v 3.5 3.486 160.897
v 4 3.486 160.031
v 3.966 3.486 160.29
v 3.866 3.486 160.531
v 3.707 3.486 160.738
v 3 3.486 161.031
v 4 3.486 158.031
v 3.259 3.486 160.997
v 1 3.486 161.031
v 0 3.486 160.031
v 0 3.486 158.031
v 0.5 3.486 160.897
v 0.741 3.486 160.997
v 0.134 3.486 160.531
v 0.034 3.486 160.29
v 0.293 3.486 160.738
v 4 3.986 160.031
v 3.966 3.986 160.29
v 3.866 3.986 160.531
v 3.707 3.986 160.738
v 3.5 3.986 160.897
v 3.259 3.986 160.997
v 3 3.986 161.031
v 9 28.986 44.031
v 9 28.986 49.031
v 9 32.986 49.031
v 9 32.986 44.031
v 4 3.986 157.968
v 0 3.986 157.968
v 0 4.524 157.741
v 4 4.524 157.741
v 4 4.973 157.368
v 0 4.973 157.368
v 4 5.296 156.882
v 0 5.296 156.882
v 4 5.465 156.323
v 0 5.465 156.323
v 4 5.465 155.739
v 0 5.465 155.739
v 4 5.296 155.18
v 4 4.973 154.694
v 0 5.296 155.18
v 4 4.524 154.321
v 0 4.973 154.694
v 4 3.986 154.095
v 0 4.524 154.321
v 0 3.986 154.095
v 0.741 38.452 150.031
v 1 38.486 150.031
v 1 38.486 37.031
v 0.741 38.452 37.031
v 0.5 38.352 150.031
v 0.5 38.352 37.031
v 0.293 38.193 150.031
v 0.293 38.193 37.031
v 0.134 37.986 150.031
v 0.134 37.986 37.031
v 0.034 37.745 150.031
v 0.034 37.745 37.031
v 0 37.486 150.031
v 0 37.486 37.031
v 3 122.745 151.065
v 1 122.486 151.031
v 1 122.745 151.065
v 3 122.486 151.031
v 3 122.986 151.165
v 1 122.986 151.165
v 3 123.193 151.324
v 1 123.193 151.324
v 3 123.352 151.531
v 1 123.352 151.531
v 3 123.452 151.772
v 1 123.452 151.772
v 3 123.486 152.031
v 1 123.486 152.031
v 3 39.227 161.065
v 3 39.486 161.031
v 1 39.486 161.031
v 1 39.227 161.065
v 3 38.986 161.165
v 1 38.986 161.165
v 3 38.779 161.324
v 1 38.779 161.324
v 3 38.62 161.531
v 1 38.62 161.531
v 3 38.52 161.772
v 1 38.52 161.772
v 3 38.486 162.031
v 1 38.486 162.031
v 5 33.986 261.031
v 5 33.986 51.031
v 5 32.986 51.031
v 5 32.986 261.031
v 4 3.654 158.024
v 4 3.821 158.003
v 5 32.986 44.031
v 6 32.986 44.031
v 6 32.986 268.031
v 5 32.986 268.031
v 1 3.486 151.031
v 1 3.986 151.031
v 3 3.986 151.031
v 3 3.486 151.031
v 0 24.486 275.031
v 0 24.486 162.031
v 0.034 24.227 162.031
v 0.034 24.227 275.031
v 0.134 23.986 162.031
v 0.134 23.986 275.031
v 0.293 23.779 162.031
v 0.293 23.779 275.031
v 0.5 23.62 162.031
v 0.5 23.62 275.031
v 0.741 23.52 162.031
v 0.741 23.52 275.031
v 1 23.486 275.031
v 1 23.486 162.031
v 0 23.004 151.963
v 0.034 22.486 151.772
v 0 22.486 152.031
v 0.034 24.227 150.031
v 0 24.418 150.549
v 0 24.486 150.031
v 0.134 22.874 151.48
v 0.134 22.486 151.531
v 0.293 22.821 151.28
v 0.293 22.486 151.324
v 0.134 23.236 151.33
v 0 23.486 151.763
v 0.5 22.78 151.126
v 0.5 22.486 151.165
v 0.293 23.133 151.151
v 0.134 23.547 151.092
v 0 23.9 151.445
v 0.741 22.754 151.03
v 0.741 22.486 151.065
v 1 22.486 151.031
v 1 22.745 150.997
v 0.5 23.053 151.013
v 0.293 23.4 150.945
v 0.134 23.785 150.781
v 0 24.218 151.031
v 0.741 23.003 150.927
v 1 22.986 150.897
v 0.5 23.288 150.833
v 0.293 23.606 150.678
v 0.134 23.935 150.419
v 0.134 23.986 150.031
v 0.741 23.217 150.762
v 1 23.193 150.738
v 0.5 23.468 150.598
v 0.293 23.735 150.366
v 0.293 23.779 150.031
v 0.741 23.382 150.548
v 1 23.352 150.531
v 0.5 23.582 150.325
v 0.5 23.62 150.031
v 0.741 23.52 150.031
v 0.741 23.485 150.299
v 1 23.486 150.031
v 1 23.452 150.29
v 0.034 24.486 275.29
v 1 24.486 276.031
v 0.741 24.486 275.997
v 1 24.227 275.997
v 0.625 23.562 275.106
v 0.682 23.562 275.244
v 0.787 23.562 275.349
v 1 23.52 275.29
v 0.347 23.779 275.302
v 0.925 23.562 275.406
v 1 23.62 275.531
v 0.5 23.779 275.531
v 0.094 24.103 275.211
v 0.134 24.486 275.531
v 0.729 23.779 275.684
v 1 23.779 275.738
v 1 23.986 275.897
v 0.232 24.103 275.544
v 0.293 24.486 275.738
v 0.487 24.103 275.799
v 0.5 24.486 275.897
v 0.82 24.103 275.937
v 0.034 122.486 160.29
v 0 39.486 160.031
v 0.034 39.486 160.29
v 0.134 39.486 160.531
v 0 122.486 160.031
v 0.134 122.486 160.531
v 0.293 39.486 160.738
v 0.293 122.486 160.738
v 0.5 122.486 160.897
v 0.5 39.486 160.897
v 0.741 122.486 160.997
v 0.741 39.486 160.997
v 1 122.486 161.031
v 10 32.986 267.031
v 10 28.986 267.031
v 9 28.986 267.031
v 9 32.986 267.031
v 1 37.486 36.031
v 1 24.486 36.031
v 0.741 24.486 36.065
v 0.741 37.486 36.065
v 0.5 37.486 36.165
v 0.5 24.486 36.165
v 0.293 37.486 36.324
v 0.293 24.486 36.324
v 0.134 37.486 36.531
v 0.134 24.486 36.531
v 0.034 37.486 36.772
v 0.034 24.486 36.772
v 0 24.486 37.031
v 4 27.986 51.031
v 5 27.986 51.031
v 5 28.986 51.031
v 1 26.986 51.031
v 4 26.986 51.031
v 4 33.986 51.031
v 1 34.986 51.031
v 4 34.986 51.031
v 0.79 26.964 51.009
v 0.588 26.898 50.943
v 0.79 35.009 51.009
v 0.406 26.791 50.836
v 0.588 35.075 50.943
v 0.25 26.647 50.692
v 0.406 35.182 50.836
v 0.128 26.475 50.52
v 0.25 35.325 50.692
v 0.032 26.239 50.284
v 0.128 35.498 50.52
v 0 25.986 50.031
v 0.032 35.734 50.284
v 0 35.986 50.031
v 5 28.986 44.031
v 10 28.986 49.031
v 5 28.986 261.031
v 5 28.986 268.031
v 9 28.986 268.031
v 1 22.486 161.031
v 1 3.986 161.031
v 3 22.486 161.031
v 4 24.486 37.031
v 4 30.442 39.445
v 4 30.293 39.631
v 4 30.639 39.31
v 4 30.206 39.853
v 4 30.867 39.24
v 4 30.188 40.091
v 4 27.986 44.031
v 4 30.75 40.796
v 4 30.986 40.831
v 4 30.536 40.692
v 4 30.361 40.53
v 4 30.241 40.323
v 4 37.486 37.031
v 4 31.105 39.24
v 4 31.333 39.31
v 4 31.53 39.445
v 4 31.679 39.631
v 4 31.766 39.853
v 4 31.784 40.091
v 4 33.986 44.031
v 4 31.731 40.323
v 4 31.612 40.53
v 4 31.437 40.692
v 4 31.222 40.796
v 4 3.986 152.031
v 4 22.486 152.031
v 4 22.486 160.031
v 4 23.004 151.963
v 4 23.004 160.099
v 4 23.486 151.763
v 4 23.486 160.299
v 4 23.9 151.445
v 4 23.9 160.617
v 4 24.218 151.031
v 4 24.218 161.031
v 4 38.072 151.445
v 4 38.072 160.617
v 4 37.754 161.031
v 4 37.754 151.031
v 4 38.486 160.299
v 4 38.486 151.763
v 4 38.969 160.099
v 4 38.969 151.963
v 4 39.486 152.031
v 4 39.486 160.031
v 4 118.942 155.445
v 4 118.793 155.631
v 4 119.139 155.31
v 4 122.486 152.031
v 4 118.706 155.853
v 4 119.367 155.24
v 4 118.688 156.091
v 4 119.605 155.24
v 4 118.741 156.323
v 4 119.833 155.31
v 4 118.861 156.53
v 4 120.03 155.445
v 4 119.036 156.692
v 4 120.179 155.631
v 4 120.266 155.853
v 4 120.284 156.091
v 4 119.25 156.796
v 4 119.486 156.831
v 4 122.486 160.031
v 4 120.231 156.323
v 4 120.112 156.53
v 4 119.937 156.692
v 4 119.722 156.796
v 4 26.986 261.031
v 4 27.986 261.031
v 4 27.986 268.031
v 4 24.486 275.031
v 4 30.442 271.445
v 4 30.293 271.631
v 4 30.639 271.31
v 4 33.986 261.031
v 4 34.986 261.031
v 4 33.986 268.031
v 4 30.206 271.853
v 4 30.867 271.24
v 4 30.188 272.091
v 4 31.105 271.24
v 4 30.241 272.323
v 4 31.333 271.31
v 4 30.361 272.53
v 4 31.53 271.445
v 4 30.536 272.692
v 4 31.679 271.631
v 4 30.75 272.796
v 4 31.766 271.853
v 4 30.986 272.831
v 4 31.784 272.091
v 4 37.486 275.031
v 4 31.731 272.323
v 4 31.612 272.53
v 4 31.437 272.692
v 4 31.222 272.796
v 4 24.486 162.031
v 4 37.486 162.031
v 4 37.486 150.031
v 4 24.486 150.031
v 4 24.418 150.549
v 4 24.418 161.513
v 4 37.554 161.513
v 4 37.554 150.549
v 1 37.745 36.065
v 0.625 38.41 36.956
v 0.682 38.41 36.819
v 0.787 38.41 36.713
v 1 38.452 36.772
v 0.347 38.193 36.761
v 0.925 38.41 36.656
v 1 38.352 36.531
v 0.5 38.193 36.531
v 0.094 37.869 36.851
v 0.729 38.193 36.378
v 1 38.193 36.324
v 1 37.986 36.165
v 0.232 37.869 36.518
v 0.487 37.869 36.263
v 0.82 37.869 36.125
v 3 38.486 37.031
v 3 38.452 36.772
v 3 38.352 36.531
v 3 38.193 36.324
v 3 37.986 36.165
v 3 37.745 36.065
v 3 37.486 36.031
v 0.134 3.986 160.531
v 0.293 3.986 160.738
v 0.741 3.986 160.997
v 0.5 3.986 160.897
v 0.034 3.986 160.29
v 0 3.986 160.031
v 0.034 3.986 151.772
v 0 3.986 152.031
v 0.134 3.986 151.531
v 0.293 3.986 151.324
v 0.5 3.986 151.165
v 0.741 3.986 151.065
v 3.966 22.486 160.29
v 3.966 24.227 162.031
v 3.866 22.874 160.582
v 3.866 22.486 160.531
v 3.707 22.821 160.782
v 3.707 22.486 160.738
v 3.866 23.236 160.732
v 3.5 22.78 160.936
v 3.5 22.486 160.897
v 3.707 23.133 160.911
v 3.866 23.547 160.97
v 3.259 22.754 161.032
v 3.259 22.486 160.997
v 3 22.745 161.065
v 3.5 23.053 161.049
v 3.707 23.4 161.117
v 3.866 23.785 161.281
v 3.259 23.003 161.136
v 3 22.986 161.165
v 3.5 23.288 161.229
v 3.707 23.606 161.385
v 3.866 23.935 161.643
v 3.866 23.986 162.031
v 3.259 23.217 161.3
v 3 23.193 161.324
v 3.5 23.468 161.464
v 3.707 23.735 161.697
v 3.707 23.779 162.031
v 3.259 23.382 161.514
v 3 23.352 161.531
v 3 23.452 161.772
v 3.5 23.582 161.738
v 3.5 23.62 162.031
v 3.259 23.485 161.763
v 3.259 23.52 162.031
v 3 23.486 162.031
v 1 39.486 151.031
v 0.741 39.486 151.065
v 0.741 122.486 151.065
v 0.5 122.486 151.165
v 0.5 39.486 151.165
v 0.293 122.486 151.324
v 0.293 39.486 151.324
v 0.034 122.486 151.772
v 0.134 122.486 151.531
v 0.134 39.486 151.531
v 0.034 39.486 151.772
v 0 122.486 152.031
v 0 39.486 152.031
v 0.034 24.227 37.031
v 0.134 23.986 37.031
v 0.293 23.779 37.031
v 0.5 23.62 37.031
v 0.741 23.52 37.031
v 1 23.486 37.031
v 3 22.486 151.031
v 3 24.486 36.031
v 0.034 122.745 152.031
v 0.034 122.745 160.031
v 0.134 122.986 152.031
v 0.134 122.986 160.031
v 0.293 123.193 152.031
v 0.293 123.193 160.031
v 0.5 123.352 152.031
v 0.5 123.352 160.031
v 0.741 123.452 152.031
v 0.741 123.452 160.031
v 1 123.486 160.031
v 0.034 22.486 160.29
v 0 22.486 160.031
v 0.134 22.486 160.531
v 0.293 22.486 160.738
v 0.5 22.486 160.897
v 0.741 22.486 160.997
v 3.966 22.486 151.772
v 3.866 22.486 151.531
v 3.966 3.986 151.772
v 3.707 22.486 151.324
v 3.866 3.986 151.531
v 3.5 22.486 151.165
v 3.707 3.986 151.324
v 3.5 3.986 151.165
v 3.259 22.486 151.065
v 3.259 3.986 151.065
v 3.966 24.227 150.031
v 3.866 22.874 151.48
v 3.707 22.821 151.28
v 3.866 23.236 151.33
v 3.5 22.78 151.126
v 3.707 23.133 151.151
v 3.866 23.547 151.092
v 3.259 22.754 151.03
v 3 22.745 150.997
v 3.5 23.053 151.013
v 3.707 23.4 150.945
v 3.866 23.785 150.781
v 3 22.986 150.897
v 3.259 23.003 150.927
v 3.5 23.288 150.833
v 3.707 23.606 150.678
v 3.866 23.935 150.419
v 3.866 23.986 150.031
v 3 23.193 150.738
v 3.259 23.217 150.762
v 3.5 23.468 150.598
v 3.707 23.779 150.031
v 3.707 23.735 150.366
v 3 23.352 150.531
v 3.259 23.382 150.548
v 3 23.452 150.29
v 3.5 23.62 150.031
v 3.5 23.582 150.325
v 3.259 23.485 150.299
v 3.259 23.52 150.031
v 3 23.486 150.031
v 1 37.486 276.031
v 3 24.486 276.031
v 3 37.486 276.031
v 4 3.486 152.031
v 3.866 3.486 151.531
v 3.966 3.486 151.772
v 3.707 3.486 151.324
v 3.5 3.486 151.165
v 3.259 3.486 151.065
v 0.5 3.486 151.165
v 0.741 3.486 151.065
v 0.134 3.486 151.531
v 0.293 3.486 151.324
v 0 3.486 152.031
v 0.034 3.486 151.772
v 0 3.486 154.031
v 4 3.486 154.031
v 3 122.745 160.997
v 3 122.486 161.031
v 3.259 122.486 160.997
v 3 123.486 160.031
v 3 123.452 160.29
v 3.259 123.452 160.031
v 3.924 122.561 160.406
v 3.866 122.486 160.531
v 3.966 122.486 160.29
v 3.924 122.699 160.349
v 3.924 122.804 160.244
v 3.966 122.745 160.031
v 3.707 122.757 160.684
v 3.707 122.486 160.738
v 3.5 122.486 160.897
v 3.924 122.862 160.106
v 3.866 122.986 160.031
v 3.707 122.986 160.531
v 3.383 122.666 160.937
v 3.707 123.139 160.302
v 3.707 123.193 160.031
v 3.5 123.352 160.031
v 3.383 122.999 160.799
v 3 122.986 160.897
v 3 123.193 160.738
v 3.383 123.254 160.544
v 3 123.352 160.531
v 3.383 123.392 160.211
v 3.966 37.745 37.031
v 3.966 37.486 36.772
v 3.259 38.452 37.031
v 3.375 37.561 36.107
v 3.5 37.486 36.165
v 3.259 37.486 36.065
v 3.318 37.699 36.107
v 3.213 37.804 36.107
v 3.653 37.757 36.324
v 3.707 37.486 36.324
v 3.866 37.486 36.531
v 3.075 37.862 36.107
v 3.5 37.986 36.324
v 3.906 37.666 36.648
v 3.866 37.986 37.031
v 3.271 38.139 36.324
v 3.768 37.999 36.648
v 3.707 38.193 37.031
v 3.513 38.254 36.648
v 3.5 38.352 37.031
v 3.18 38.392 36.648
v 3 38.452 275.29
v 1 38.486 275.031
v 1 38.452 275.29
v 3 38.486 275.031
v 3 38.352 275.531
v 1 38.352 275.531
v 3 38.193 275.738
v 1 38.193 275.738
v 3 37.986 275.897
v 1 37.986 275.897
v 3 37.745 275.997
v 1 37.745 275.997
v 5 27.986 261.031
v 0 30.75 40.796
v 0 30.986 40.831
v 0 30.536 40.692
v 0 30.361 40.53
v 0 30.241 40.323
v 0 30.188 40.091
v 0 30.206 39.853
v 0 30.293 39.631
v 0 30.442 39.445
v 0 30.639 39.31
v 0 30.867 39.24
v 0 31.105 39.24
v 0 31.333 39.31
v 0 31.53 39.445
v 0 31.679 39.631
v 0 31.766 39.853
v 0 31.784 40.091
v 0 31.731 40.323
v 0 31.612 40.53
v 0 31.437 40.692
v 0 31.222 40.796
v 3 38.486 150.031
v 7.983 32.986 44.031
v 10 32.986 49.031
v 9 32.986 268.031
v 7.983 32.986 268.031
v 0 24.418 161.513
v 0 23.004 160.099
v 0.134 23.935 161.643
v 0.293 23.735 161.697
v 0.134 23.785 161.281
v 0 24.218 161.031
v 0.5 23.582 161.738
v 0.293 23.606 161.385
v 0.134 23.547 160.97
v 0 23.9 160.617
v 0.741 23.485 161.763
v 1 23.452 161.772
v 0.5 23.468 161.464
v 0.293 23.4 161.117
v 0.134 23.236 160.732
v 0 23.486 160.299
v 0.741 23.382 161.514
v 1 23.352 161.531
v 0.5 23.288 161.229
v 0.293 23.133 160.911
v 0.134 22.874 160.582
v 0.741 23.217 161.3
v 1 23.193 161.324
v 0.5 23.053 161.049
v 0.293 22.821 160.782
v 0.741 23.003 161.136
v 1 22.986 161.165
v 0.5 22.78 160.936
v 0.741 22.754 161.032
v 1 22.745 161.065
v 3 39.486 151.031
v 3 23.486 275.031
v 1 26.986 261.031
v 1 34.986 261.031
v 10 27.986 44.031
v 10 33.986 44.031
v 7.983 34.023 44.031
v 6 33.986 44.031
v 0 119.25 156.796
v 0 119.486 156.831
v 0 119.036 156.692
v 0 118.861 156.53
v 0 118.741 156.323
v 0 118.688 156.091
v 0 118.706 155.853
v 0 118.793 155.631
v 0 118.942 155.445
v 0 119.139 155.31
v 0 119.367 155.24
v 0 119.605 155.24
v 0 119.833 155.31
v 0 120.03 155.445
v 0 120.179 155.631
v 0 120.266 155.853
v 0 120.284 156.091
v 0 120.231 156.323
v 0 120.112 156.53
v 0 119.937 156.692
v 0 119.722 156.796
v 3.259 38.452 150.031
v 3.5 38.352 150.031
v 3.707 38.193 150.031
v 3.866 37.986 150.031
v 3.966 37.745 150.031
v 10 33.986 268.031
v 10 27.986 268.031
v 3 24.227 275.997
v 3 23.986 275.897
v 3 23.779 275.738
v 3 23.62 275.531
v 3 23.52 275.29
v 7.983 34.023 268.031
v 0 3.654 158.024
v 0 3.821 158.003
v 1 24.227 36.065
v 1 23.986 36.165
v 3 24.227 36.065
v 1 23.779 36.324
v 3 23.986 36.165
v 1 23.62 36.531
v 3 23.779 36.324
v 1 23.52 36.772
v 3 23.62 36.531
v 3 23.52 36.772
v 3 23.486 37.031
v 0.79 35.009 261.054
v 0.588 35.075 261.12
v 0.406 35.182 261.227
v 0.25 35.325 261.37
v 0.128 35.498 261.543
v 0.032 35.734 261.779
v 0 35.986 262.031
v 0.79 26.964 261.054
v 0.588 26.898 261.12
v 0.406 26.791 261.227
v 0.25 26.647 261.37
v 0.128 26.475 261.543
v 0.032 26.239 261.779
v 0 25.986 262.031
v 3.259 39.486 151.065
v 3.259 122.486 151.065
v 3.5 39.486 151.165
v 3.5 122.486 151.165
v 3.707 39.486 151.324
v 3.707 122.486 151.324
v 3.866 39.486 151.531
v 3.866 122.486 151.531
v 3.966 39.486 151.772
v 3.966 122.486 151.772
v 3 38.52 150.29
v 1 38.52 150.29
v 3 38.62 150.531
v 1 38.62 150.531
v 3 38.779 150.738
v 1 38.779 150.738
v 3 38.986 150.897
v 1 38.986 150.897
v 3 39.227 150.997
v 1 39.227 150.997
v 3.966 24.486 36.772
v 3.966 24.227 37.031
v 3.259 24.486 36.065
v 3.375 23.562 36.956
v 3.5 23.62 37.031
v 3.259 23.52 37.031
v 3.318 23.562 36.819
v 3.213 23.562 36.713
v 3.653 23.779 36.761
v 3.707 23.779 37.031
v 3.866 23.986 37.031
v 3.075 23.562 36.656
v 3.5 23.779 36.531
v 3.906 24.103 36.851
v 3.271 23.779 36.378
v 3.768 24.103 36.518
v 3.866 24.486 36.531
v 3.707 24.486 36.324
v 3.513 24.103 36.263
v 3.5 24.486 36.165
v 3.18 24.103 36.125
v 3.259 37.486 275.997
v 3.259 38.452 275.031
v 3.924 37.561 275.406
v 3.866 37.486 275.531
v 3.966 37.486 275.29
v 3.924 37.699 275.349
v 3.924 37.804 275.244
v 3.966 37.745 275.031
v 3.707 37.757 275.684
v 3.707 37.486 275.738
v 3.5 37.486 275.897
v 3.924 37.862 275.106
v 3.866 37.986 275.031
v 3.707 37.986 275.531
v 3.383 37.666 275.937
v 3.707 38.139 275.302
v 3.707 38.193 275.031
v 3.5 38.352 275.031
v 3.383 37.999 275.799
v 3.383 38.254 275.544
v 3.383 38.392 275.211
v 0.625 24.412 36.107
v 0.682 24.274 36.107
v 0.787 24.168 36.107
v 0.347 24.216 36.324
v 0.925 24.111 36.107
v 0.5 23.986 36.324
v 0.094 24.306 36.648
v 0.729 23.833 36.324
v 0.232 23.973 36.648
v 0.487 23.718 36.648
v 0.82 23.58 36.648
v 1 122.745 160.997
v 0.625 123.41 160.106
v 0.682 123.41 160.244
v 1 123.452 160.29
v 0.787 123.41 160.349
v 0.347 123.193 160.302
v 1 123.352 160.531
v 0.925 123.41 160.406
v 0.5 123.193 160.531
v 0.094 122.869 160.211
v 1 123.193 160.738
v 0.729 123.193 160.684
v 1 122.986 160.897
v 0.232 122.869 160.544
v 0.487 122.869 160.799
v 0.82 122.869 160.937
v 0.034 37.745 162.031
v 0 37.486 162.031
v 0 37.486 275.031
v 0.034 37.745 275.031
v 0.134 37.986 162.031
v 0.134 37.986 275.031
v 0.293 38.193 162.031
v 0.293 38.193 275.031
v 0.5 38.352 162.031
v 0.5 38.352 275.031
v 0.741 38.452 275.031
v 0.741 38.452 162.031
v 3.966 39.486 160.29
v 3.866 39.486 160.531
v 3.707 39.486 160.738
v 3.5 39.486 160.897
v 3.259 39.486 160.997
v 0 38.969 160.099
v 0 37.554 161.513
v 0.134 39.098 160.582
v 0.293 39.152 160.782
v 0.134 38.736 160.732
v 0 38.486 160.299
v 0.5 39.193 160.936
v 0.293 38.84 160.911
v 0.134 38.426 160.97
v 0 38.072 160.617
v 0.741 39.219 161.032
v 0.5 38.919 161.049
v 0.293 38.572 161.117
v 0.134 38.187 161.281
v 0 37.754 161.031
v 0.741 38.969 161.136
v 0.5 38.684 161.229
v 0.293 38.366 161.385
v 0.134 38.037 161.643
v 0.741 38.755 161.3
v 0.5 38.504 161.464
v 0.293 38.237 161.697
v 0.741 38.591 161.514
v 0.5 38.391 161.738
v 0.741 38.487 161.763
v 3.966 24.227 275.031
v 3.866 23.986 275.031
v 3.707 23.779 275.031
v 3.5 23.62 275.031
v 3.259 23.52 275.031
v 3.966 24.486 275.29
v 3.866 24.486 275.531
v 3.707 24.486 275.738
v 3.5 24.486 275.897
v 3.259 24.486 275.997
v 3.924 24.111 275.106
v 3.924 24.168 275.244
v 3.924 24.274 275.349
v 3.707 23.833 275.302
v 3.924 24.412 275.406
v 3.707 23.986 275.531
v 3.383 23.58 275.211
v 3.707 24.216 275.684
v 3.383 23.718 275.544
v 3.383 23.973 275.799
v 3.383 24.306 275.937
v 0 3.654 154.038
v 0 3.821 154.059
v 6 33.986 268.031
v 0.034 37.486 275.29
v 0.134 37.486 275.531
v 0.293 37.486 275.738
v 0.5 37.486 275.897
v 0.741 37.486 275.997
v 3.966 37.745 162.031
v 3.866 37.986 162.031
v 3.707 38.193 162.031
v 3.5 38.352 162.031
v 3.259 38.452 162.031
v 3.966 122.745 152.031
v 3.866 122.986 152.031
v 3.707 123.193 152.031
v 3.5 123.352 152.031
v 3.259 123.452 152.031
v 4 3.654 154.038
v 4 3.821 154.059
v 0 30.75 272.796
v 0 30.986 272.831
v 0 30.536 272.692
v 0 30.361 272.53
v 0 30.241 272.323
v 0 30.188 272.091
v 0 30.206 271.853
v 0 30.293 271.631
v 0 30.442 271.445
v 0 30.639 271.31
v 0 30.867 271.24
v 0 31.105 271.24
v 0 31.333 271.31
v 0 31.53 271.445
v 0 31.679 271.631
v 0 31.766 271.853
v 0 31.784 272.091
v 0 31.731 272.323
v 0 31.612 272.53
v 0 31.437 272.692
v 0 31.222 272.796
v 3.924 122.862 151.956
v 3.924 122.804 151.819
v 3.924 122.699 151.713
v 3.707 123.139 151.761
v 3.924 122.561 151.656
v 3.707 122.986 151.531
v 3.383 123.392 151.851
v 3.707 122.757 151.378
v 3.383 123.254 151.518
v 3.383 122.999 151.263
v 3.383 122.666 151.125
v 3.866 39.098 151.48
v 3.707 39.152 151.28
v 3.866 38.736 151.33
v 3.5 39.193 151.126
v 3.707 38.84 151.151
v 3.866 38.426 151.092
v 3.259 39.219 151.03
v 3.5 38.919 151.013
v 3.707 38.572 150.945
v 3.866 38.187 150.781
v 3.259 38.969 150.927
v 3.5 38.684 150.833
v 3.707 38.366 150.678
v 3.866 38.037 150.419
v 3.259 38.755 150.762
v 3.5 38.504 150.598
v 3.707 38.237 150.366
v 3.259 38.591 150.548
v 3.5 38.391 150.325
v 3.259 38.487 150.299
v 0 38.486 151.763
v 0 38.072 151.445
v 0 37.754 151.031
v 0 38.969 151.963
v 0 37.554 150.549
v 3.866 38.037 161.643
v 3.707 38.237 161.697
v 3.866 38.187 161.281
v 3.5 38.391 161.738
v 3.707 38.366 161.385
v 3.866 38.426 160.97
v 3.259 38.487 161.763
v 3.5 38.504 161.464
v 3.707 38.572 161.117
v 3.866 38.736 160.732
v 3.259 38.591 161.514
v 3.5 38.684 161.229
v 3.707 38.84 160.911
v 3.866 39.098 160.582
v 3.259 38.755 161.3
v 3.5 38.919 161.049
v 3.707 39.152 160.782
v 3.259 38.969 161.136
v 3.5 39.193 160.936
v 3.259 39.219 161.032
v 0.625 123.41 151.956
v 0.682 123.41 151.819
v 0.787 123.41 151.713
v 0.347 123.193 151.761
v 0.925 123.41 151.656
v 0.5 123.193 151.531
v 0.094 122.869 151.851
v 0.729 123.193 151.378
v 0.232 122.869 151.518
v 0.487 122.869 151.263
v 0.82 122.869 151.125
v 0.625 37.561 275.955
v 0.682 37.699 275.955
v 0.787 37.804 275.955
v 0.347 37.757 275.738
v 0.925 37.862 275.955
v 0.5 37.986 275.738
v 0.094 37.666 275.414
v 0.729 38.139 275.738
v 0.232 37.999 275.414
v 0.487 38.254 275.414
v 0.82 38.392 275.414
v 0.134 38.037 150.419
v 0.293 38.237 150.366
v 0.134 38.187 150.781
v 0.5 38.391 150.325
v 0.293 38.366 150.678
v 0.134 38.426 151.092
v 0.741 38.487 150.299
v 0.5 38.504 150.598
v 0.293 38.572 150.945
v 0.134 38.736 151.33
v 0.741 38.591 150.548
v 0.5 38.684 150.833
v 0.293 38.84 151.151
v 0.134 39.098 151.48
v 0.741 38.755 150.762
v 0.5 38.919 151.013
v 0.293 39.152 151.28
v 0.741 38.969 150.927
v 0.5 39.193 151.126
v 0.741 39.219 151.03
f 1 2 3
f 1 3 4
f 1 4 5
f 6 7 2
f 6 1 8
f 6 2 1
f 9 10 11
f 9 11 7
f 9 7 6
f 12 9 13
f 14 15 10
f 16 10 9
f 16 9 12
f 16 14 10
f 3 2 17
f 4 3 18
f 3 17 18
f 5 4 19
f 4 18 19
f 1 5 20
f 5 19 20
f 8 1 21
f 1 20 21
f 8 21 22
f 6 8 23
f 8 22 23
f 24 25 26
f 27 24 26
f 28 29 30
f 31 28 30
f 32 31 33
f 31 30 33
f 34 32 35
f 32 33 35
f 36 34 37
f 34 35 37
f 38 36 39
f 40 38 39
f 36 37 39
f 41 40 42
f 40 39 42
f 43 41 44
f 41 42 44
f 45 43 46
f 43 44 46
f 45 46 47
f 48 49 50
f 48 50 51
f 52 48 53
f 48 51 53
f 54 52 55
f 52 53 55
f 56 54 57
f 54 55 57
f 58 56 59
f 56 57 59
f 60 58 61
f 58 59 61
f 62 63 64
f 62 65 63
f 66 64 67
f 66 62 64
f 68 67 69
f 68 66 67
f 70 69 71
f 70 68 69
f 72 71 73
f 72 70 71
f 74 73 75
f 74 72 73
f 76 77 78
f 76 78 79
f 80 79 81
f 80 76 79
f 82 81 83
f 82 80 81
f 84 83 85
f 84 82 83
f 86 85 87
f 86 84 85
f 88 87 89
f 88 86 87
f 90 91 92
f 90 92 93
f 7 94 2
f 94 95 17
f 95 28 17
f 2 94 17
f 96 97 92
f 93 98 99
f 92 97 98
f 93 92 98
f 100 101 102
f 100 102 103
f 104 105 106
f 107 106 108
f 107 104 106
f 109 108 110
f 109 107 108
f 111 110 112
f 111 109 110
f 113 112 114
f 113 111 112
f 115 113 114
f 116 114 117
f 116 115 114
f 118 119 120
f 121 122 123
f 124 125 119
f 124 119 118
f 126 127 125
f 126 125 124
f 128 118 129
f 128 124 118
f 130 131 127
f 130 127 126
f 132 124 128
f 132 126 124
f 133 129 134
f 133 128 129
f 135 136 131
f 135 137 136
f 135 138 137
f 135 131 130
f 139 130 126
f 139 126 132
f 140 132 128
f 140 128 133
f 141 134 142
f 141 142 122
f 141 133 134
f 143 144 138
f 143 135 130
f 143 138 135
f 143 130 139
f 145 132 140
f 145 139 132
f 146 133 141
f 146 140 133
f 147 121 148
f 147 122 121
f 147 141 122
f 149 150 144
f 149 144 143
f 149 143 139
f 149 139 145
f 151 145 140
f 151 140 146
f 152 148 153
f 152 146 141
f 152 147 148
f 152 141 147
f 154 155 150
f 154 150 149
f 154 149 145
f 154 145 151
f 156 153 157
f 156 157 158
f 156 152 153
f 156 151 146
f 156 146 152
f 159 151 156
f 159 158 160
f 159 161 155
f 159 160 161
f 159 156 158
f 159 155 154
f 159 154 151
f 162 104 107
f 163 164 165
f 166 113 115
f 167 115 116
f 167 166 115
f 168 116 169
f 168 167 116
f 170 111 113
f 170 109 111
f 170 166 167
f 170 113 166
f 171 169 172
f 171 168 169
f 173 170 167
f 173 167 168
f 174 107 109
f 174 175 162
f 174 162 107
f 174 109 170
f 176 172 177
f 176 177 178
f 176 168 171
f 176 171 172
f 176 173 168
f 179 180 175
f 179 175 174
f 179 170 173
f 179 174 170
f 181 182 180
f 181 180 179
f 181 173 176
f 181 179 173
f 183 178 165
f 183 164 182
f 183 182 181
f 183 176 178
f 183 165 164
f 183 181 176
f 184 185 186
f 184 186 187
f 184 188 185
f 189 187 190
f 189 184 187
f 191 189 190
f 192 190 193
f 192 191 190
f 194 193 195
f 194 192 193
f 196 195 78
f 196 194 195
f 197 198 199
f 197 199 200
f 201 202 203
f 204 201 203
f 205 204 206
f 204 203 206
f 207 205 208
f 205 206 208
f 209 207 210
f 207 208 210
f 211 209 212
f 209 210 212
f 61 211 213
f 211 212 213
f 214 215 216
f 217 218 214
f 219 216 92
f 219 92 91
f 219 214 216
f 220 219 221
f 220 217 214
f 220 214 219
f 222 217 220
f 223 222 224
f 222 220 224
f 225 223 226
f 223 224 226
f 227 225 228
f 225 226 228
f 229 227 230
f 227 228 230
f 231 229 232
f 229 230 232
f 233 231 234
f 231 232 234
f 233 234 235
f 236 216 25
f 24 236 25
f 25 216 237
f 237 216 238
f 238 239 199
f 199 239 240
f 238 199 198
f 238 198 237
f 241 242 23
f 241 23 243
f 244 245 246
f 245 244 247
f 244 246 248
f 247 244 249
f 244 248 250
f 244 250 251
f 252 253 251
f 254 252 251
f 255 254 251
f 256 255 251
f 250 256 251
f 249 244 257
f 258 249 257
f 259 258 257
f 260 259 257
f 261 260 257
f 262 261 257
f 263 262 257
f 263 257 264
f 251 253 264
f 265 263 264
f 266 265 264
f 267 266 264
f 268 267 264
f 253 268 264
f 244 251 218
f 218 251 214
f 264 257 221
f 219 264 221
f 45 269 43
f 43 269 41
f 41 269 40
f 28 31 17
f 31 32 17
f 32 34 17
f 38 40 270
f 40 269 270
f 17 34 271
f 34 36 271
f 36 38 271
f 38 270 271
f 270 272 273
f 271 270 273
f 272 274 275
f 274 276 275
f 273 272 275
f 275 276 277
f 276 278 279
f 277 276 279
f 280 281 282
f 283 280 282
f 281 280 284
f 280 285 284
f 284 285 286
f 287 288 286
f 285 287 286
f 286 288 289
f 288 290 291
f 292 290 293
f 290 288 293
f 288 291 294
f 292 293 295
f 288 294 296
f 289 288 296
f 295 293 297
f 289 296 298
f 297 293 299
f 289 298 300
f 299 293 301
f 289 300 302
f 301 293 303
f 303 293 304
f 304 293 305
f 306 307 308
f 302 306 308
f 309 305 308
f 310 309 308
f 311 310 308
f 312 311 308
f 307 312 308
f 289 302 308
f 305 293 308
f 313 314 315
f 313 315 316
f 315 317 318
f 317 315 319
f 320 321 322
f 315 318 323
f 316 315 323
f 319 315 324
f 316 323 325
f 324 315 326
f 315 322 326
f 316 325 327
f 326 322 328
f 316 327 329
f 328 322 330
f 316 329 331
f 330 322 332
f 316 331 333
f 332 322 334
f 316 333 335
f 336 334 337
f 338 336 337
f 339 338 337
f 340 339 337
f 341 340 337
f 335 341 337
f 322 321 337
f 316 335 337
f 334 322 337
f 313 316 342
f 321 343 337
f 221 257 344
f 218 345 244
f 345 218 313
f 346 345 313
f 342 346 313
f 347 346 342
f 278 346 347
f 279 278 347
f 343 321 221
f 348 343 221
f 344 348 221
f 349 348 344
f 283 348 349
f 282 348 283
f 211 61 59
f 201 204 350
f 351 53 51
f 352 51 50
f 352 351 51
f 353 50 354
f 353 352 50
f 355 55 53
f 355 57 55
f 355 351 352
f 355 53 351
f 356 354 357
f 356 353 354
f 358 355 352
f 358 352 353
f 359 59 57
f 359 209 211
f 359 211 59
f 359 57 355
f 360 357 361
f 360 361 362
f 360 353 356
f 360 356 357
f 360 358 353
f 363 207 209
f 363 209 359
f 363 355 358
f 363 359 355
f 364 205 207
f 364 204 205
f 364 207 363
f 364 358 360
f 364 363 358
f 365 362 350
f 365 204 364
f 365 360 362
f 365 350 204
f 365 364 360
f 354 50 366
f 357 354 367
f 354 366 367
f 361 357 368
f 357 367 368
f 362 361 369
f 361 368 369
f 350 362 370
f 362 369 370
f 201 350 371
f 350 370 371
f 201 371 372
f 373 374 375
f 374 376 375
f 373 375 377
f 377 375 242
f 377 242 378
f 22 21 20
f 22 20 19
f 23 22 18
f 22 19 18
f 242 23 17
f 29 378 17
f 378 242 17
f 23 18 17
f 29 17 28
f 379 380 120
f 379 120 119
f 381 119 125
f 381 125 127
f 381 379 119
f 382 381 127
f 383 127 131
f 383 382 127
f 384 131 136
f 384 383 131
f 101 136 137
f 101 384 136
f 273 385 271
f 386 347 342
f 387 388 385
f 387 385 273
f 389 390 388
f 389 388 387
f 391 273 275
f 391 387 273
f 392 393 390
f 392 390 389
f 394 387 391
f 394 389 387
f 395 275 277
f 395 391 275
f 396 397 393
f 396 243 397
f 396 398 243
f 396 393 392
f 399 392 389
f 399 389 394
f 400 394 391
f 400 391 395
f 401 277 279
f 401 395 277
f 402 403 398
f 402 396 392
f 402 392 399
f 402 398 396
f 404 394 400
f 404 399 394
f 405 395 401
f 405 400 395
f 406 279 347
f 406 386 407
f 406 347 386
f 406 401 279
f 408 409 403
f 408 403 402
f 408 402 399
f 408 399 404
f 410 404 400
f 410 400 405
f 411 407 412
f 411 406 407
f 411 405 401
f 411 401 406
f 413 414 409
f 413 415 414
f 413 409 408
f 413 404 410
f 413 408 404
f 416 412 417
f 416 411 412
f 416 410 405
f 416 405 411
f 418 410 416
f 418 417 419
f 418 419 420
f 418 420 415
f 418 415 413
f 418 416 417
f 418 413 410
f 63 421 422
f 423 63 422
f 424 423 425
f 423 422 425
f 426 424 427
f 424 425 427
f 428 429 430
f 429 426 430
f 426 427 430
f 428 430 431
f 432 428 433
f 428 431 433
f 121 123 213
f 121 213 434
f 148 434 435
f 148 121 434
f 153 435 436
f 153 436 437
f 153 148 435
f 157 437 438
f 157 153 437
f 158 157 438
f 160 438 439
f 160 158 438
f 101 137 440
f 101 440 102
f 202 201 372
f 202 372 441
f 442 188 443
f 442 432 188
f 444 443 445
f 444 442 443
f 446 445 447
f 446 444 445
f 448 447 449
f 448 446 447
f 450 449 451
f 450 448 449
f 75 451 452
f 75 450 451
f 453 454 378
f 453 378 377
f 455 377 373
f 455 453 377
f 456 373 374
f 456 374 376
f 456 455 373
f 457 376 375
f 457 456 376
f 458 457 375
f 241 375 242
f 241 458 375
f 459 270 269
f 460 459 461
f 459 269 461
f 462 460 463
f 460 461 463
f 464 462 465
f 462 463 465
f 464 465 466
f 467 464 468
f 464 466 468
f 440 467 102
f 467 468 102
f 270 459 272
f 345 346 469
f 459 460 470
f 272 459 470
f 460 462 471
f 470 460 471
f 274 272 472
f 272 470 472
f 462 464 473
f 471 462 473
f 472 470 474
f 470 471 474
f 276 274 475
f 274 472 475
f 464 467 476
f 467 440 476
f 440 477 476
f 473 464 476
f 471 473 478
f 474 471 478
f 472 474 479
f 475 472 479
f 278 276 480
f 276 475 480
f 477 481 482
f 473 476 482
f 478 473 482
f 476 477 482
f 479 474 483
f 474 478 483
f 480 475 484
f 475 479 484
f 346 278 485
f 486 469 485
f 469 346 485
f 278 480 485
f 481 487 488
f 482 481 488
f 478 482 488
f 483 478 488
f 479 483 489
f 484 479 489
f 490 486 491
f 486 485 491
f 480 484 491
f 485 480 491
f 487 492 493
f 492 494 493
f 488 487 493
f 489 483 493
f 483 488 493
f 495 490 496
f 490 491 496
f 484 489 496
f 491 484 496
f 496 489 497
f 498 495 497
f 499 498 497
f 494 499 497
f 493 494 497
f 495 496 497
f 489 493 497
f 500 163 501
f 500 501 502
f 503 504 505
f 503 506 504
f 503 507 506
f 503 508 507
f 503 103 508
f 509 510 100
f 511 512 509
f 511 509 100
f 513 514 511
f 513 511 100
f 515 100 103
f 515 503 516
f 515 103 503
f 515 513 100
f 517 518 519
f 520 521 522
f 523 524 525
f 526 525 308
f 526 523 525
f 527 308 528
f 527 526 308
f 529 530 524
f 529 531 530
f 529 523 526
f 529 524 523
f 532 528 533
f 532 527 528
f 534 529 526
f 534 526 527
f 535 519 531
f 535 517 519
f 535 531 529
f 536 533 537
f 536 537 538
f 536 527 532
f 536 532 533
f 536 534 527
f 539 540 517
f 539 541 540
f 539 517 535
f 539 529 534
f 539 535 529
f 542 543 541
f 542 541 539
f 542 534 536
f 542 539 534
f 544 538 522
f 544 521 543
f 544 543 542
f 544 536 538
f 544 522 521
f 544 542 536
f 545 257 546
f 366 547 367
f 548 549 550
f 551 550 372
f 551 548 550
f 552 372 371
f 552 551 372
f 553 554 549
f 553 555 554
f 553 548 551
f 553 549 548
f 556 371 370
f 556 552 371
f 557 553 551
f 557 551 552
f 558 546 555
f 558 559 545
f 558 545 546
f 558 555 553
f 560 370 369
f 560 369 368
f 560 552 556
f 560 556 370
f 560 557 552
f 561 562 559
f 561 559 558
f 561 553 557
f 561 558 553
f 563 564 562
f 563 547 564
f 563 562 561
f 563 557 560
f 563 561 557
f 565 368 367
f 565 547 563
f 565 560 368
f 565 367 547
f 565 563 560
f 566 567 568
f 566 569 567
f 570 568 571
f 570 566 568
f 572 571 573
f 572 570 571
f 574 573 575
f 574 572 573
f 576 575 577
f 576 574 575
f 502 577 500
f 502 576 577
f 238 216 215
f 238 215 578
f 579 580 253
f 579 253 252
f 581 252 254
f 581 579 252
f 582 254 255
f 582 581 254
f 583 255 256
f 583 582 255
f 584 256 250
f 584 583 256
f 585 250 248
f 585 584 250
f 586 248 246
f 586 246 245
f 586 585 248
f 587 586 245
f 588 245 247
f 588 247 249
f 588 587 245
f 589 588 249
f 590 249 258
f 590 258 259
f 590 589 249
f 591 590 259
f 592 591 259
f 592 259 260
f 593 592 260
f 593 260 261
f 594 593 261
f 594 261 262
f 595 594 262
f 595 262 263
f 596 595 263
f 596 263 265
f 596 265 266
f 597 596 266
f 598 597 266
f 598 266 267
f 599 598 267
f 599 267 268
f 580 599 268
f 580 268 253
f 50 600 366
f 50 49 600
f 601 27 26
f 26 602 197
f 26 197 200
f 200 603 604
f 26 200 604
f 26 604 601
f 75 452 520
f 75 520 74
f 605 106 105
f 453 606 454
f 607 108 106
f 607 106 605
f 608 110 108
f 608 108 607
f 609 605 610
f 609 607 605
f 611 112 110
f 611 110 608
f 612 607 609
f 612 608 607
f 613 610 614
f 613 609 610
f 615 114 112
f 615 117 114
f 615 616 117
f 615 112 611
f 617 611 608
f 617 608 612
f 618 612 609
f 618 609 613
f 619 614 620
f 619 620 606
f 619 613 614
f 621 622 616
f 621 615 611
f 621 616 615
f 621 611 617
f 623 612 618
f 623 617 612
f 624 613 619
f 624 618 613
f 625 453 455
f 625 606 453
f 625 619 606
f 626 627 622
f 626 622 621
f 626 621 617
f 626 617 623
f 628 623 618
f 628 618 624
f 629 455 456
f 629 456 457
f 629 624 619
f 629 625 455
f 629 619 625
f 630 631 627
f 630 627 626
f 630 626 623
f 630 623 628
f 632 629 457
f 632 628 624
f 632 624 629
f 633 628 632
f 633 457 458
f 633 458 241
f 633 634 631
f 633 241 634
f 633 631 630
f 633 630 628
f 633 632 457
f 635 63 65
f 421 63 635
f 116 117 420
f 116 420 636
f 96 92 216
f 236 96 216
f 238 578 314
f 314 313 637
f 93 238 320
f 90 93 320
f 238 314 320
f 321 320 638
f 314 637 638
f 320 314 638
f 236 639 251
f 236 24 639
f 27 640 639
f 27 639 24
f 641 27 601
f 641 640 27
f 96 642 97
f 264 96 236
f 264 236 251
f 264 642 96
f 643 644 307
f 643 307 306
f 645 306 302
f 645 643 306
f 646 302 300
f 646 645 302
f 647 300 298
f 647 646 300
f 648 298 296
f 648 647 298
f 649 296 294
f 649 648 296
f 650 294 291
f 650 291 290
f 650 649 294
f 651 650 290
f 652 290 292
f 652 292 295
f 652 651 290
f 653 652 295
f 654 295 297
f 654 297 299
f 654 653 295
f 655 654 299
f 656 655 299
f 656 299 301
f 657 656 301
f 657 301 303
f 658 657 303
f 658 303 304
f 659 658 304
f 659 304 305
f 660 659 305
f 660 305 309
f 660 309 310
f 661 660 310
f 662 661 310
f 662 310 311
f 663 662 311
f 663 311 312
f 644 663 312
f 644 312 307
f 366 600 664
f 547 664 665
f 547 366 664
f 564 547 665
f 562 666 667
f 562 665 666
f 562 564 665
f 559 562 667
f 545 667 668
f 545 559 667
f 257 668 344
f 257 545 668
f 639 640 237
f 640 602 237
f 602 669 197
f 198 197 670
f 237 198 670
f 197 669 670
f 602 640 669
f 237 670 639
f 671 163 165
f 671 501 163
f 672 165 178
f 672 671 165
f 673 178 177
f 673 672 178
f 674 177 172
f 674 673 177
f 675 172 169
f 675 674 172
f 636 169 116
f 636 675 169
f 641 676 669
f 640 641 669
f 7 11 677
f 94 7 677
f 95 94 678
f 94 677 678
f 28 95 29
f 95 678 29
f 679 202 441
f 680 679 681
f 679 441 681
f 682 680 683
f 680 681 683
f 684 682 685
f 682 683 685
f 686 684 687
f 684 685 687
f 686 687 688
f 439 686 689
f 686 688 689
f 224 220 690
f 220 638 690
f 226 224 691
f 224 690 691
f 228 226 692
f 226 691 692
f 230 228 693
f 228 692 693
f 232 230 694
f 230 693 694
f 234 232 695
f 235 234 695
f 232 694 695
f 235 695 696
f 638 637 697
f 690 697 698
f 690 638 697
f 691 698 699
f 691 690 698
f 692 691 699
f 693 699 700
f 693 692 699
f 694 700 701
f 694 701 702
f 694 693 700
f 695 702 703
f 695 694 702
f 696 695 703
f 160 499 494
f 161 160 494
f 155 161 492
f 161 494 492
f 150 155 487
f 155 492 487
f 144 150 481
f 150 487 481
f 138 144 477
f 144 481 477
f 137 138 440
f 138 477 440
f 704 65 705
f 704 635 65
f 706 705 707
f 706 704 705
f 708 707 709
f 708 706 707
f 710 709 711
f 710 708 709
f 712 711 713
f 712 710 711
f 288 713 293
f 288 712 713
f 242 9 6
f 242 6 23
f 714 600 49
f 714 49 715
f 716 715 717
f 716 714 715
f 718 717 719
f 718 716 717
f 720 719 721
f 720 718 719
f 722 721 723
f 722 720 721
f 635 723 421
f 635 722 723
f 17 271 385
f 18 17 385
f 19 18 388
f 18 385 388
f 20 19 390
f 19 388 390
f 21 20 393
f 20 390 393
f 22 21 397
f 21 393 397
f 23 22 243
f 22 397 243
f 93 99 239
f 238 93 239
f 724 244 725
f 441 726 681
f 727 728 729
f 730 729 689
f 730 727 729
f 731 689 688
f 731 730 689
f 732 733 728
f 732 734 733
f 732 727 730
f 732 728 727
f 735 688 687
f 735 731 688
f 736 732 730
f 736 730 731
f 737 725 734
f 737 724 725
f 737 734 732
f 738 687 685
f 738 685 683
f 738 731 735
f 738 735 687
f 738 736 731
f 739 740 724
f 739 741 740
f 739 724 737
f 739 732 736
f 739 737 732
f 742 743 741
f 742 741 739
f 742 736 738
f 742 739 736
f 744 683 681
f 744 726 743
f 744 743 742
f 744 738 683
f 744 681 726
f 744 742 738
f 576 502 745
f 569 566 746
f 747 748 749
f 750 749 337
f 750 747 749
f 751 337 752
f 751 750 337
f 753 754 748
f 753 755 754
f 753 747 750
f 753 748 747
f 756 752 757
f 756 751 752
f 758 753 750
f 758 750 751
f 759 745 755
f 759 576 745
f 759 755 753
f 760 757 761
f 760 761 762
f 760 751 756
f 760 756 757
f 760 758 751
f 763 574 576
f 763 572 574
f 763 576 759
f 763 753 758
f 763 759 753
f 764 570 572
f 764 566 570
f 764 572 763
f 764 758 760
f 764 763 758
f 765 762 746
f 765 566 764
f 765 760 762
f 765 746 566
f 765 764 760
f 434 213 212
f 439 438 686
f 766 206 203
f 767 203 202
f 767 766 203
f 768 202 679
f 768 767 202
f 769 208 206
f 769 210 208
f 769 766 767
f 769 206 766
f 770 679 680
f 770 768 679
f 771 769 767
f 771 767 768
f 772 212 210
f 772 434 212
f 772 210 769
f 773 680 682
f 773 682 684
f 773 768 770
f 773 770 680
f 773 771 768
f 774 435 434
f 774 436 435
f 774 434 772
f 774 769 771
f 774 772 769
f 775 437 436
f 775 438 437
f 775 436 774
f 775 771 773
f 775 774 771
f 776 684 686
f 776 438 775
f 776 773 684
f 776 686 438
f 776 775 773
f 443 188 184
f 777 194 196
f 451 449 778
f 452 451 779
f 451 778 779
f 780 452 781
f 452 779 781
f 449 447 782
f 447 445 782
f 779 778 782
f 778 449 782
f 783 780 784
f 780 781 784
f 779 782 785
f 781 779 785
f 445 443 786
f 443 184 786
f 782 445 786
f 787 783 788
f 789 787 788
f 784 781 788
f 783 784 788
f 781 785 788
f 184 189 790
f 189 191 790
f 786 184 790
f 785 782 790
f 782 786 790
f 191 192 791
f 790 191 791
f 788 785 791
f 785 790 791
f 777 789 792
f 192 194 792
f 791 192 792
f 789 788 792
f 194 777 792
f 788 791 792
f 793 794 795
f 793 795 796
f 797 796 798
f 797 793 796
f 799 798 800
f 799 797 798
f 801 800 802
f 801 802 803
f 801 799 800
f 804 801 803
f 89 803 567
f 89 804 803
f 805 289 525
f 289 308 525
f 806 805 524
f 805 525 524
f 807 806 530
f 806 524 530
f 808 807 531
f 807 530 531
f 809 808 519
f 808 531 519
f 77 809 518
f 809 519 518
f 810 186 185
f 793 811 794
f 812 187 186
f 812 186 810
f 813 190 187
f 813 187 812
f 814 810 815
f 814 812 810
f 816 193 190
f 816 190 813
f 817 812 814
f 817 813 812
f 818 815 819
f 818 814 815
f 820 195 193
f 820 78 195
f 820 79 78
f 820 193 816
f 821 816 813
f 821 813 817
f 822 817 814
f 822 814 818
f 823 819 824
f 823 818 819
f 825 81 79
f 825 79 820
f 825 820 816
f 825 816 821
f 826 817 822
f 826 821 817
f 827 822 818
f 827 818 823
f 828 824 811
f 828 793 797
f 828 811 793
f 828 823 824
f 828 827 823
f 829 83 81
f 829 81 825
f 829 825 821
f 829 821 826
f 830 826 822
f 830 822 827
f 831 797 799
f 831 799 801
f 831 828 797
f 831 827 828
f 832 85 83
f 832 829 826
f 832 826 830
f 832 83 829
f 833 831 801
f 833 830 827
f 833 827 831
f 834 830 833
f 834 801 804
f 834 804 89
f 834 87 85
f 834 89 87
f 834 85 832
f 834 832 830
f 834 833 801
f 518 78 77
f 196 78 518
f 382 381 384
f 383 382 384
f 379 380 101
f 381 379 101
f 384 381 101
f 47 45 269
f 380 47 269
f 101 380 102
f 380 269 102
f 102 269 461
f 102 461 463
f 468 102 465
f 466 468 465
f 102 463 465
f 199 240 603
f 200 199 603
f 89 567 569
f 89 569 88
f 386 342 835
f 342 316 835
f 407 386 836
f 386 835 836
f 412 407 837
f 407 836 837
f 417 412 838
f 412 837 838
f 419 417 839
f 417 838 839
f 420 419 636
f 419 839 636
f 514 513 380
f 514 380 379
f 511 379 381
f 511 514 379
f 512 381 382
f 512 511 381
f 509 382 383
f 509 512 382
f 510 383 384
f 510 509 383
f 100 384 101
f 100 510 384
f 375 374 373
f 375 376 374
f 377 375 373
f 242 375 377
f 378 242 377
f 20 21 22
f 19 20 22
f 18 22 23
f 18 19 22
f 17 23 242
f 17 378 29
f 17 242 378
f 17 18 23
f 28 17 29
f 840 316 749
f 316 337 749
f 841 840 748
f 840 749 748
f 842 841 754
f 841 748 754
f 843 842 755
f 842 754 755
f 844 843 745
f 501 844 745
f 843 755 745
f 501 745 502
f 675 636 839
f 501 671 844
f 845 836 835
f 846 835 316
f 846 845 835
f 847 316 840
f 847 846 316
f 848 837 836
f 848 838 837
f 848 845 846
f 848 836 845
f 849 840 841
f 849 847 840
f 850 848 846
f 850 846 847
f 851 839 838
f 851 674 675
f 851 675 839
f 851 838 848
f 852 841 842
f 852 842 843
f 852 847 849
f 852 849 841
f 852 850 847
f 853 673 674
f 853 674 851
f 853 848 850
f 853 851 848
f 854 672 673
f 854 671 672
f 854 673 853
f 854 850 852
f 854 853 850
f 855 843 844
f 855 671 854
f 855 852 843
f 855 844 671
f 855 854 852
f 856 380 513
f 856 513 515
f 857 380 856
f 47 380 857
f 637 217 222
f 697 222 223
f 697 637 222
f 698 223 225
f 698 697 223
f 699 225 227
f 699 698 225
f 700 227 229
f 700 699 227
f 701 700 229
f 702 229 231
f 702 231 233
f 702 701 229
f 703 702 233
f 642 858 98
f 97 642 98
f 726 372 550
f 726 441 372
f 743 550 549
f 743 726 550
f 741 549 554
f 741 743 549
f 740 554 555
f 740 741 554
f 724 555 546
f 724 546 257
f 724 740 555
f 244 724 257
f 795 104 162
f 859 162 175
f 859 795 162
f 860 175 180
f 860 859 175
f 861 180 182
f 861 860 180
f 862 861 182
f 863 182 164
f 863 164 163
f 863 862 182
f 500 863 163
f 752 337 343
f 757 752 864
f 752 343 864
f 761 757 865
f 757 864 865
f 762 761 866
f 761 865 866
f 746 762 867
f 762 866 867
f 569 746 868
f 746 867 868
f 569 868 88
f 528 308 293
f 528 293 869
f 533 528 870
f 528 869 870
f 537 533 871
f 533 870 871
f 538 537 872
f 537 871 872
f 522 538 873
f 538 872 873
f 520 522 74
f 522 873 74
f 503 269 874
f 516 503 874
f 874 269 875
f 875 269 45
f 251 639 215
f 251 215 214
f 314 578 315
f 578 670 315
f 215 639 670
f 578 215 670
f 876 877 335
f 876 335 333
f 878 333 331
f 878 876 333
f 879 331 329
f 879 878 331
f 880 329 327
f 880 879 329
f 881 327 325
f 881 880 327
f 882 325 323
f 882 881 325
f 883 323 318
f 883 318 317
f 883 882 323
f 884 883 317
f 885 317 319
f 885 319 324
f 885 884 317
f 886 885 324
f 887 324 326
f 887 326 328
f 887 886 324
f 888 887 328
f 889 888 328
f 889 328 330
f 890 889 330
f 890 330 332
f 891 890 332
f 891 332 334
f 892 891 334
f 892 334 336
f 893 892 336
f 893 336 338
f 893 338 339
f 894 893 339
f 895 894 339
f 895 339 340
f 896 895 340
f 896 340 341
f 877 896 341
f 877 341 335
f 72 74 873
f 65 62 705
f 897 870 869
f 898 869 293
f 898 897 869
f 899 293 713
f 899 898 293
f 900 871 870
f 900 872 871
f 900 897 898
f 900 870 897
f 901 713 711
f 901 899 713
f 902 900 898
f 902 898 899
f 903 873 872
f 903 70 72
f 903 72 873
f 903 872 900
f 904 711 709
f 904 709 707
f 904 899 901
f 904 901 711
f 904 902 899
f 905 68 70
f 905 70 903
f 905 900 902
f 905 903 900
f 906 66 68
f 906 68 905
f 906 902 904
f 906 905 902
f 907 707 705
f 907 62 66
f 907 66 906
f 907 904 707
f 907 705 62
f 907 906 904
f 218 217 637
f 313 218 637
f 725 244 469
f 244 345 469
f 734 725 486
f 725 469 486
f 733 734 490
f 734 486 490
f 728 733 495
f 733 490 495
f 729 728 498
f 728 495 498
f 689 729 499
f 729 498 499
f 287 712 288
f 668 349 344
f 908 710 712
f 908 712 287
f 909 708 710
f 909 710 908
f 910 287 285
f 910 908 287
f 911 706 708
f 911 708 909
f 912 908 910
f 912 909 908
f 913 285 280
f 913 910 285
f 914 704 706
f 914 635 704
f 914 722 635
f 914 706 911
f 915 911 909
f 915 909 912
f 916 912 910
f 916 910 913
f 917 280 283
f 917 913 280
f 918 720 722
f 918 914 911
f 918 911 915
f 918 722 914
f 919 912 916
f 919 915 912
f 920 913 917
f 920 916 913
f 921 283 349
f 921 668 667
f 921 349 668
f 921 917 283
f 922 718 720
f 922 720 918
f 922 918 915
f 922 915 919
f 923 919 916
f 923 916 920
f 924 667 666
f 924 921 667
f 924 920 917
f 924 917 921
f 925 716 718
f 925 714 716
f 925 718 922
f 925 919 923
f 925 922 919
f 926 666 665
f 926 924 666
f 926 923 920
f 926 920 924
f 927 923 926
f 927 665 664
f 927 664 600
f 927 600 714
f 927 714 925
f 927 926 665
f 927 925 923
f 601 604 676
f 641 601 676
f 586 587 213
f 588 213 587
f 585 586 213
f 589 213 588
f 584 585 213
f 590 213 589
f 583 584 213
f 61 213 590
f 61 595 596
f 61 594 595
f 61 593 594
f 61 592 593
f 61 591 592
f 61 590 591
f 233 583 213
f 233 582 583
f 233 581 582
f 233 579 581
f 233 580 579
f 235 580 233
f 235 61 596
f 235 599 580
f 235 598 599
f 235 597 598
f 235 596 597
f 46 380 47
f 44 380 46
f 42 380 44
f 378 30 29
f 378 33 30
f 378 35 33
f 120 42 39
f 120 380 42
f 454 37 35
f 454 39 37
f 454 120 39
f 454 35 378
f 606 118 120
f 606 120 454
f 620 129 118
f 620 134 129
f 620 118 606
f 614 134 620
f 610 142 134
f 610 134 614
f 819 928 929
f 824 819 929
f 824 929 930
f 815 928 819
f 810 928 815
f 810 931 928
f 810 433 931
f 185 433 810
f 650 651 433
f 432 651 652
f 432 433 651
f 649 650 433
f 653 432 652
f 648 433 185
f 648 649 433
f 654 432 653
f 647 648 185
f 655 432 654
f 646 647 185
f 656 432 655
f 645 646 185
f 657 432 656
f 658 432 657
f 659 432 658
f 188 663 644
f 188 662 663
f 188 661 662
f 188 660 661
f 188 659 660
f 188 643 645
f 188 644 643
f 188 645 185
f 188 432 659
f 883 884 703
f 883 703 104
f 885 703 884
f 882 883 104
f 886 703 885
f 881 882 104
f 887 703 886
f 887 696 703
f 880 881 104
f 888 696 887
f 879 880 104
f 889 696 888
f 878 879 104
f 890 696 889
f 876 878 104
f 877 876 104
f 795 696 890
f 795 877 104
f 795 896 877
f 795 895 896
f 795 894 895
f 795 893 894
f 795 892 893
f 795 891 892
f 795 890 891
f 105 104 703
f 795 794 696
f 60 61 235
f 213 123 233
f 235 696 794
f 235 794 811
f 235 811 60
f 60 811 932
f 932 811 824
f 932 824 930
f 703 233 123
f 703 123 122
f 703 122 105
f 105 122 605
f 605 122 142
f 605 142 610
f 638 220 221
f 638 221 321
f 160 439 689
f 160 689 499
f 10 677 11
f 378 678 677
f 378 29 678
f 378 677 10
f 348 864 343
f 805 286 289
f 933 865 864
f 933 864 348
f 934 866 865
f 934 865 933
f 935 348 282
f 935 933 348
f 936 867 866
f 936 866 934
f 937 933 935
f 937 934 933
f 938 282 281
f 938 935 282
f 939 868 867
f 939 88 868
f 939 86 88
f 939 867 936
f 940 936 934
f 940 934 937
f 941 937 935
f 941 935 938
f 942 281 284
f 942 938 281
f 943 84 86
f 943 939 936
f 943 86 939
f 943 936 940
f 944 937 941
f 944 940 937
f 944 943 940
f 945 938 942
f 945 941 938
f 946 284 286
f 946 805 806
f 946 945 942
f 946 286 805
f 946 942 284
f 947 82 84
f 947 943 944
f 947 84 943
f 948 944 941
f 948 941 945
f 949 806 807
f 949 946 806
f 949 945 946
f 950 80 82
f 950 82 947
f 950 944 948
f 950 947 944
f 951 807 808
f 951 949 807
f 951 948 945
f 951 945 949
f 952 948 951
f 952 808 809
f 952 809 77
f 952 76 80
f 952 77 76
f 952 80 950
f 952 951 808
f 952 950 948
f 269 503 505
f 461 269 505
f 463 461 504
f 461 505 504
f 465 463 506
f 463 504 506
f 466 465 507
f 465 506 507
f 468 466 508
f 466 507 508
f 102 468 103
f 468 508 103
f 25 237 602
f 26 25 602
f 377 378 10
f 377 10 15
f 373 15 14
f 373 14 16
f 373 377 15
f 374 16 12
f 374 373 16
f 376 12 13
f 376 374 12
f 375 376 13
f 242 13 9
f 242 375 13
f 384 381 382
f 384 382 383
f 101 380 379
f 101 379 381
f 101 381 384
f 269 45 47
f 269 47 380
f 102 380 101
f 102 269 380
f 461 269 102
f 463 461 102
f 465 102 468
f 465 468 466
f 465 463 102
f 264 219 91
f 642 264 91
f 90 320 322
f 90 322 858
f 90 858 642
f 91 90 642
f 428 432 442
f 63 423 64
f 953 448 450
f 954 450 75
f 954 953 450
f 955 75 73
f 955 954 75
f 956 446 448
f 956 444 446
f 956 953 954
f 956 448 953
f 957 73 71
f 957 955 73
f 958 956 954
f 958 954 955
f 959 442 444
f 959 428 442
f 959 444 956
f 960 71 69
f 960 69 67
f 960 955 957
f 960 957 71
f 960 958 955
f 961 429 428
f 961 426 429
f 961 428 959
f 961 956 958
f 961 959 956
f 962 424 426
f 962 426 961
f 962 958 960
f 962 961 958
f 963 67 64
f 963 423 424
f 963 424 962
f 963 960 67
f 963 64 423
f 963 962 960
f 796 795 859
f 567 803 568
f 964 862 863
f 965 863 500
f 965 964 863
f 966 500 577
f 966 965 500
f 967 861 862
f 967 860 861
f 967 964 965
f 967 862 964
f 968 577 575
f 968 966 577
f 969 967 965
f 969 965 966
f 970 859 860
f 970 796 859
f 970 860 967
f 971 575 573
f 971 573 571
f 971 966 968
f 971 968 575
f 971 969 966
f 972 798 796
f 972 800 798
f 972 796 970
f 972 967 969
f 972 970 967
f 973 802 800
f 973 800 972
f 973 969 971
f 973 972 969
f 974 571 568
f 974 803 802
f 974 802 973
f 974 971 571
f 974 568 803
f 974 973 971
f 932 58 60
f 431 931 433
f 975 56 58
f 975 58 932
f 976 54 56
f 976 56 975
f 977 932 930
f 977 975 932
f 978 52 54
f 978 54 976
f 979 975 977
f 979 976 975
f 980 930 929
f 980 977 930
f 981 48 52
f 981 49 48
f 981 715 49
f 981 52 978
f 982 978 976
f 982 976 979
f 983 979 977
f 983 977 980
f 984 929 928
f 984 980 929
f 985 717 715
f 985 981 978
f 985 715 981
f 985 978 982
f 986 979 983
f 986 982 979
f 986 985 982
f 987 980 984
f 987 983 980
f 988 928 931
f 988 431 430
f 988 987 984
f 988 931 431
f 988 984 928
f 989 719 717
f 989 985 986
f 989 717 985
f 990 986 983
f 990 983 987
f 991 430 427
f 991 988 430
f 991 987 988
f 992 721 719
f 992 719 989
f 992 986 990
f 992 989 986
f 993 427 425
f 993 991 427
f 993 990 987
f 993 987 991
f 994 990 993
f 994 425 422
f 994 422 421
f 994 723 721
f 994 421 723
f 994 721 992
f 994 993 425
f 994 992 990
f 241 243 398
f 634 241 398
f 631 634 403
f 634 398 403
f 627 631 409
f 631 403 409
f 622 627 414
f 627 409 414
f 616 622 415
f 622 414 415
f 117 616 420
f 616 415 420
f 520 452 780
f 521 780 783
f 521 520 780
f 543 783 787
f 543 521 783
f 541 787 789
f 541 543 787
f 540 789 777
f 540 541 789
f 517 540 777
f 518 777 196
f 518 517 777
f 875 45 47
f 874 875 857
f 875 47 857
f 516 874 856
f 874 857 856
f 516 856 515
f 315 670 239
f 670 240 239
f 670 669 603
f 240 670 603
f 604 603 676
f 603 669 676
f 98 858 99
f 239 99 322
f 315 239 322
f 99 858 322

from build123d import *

# Parameters (mm, degrees)
BOSS_EXTRUDE1_DEPTH     = 4
CUT_EXTRUDE1_DEPTH      = 4
CUT_EXTRUDE1_DEPTH_BACK = 4
SKETCH4_R               = 0.8
SKETCH4_R_2             = 2
FILLET1_R               = 1
BOSS_EXTRUDE5_DEPTH     = 224
SKETCH9_W               = 218
SKETCH9_H               = 4
CUT_EXTRUDE2_DEPTH      = 2
SKETCH11_W              = 210
SKETCH11_H              = 8
CUT_EXTRUDE3_DEPTH      = 5
FILLET4_R               = 1
SKETCH12_R              = 2
CUT_EXTRUDE4_DEPTH      = 5


with BuildPart() as part:
    # Sketch3 → Boss-Extrude1 (new body)
    with BuildSketch(Plane(origin=(0, 0, 0), x_dir=(0, 0, -1), z_dir=(1, 0, 0))):
        Polygon((-151.031128477, 38.486176731), (-36.031128477, 38.486176731), (-36.031128477, 23.486176731), (-151.031128477, 23.486176731), (-151.031128477, 3.486176731), (-161.031128477, 3.486176731), (-161.031128477, 23.486176731), (-276.031128477, 23.486176731), (-276.031128477, 38.486176731), (-161.031128477, 38.486176731), (-161.031128477, 123.486176731), (-151.031128477, 123.486176731), align=None)
    extrude(amount=BOSS_EXTRUDE1_DEPTH)

    # Sketch4 → Cut-Extrude1 (cut, two sides: drawn at the far end of the back side and taken through both)
    with BuildSketch(Plane(origin=(0, 0, 0), x_dir=(0, 0, -1), z_dir=(1, 0, 0)).offset(-CUT_EXTRUDE1_DEPTH_BACK)):
        with Locations((-156.031128477, 119.486176731)):
            Circle(SKETCH4_R)
        with Locations((-272.031128477, 30.986176731)):
            Circle(SKETCH4_R)
        with Locations((-40.031128477, 30.986176731)):
            Circle(SKETCH4_R)
        with Locations((-156.031128477, 30.986176731)):
            Circle(SKETCH4_R_2)
    extrude(amount=CUT_EXTRUDE1_DEPTH + CUT_EXTRUDE1_DEPTH_BACK, mode=Mode.SUBTRACT)

    # Fillet1
    fillet1_edges = [part.edges().sort_by_distance(p)[0] for p in [
        (2, 123.486176731, 161.031128477),
        (2, 38.486176731, 161.031128477),
        (2, 38.486176731, 276.031128477),
        (2, 23.486176731, 276.031128477),
        (2, 23.486176731, 161.031128477),
        (2, 23.486176731, 151.031128477),
        (2, 23.486176731, 36.031128477),
        (2, 38.486176731, 36.031128477),
        (2, 38.486176731, 151.031128477),
        (2, 123.486176731, 151.031128477),
        (4, 80.986176731, 161.031128477),
        (4, 38.486176731, 218.531128477),
        (4, 30.986176731, 276.031128477),
        (4, 23.486176731, 218.531128477),
        (4, 13.486176731, 161.031128477),
        (4, 13.486176731, 151.031128477),
        (4, 23.486176731, 93.531128477),
        (4, 30.986176731, 36.031128477),
        (4, 38.486176731, 93.531128477),
        (4, 80.986176731, 151.031128477),
        (4, 123.486176731, 156.031128477),
        (0, 80.986176731, 161.031128477),
        (0, 38.486176731, 218.531128477),
        (0, 30.986176731, 276.031128477),
        (0, 23.486176731, 218.531128477),
        (0, 13.486176731, 161.031128477),
        (0, 13.486176731, 151.031128477),
        (0, 23.486176731, 93.531128477),
        (0, 30.986176731, 36.031128477),
        (0, 38.486176731, 93.531128477),
        (0, 80.986176731, 151.031128477),
        (0, 123.486176731, 156.031128477),
    ]]
    fillet(fillet1_edges, radius=FILLET1_R)

    # Sketch7 → Boss-Extrude5 (add)
    with BuildSketch(Plane.XY.offset(268.031128477)):
        Polygon((6, 33.986176731), (6, 32.986176731), (5, 32.986176731), (5, 28.986176731), (9, 28.986176731), (9, 32.986176731), (7.983095202, 32.986176731), (7.983095202, 34.023219581), (10, 33.986176731), (10, 27.986176731), (4, 27.986176731), (4, 33.986176731), align=None)
    extrude(amount=-BOSS_EXTRUDE5_DEPTH)

    # Sketch9 → Cut-Extrude2 (cut)
    with BuildSketch(Plane(origin=(10, 0, 0), x_dir=(0, 0, -1), z_dir=(1, 0, 0))):
        with Locations((-158.031128477, 30.986176731)):
            Rectangle(SKETCH9_W, SKETCH9_H)
    extrude(amount=-CUT_EXTRUDE2_DEPTH, mode=Mode.SUBTRACT)


with BuildPart() as body_2:
    # Split1: the piece on the far side of the plane
    add(part.part)
    split(bisect_by=Plane(origin=(0, 3.986176731, 0), x_dir=(0, 0, -1), z_dir=(0, -1, 0)), keep=Keep.BOTTOM)

    # Sketch11 → Cut-Extrude3 (cut)
    with BuildSketch(Plane.ZY):
        with Locations((156.031128477, 30.986176731)):
            Rectangle(SKETCH11_W, SKETCH11_H)
    extrude(amount=-CUT_EXTRUDE3_DEPTH, mode=Mode.SUBTRACT)

    # Fillet4
    fillet4_edges = [body_2.edges().sort_by_distance(p)[0] for p in [
        (0, 30.986176731, 261.031128477),
        (0, 26.986176731, 156.031128477),
        (0, 34.986176731, 156.031128477),
        (0, 30.986176731, 51.031128477),
    ]]
    fillet(fillet4_edges, radius=FILLET4_R)


with BuildPart() as part_1:
    add(part.part)

    # Split1
    split(bisect_by=Plane(origin=(0, 3.986176731, 0), x_dir=(0, 0, -1), z_dir=(0, -1, 0)), keep=Keep.TOP)


with BuildPart() as cut_extrude4_tool:
    # Sketch12 → Cut-Extrude4 (new body)
    with BuildSketch(Plane.ZY):
        with Locations((156.031128477, 3.486176731)):
            Circle(SKETCH12_R)
    extrude(amount=-CUT_EXTRUDE4_DEPTH)


with BuildPart() as part_2:
    add(part_1.part)

    # Cut-Extrude4: cut by cut_extrude4_tool
    add(cut_extrude4_tool.part, mode=Mode.SUBTRACT)


with BuildPart() as body_2_1:
    add(body_2.part)

    # Cut-Extrude4: cut by cut_extrude4_tool
    add(cut_extrude4_tool.part, mode=Mode.SUBTRACT)


solid = Compound([part_2.part, body_2_1.part])
